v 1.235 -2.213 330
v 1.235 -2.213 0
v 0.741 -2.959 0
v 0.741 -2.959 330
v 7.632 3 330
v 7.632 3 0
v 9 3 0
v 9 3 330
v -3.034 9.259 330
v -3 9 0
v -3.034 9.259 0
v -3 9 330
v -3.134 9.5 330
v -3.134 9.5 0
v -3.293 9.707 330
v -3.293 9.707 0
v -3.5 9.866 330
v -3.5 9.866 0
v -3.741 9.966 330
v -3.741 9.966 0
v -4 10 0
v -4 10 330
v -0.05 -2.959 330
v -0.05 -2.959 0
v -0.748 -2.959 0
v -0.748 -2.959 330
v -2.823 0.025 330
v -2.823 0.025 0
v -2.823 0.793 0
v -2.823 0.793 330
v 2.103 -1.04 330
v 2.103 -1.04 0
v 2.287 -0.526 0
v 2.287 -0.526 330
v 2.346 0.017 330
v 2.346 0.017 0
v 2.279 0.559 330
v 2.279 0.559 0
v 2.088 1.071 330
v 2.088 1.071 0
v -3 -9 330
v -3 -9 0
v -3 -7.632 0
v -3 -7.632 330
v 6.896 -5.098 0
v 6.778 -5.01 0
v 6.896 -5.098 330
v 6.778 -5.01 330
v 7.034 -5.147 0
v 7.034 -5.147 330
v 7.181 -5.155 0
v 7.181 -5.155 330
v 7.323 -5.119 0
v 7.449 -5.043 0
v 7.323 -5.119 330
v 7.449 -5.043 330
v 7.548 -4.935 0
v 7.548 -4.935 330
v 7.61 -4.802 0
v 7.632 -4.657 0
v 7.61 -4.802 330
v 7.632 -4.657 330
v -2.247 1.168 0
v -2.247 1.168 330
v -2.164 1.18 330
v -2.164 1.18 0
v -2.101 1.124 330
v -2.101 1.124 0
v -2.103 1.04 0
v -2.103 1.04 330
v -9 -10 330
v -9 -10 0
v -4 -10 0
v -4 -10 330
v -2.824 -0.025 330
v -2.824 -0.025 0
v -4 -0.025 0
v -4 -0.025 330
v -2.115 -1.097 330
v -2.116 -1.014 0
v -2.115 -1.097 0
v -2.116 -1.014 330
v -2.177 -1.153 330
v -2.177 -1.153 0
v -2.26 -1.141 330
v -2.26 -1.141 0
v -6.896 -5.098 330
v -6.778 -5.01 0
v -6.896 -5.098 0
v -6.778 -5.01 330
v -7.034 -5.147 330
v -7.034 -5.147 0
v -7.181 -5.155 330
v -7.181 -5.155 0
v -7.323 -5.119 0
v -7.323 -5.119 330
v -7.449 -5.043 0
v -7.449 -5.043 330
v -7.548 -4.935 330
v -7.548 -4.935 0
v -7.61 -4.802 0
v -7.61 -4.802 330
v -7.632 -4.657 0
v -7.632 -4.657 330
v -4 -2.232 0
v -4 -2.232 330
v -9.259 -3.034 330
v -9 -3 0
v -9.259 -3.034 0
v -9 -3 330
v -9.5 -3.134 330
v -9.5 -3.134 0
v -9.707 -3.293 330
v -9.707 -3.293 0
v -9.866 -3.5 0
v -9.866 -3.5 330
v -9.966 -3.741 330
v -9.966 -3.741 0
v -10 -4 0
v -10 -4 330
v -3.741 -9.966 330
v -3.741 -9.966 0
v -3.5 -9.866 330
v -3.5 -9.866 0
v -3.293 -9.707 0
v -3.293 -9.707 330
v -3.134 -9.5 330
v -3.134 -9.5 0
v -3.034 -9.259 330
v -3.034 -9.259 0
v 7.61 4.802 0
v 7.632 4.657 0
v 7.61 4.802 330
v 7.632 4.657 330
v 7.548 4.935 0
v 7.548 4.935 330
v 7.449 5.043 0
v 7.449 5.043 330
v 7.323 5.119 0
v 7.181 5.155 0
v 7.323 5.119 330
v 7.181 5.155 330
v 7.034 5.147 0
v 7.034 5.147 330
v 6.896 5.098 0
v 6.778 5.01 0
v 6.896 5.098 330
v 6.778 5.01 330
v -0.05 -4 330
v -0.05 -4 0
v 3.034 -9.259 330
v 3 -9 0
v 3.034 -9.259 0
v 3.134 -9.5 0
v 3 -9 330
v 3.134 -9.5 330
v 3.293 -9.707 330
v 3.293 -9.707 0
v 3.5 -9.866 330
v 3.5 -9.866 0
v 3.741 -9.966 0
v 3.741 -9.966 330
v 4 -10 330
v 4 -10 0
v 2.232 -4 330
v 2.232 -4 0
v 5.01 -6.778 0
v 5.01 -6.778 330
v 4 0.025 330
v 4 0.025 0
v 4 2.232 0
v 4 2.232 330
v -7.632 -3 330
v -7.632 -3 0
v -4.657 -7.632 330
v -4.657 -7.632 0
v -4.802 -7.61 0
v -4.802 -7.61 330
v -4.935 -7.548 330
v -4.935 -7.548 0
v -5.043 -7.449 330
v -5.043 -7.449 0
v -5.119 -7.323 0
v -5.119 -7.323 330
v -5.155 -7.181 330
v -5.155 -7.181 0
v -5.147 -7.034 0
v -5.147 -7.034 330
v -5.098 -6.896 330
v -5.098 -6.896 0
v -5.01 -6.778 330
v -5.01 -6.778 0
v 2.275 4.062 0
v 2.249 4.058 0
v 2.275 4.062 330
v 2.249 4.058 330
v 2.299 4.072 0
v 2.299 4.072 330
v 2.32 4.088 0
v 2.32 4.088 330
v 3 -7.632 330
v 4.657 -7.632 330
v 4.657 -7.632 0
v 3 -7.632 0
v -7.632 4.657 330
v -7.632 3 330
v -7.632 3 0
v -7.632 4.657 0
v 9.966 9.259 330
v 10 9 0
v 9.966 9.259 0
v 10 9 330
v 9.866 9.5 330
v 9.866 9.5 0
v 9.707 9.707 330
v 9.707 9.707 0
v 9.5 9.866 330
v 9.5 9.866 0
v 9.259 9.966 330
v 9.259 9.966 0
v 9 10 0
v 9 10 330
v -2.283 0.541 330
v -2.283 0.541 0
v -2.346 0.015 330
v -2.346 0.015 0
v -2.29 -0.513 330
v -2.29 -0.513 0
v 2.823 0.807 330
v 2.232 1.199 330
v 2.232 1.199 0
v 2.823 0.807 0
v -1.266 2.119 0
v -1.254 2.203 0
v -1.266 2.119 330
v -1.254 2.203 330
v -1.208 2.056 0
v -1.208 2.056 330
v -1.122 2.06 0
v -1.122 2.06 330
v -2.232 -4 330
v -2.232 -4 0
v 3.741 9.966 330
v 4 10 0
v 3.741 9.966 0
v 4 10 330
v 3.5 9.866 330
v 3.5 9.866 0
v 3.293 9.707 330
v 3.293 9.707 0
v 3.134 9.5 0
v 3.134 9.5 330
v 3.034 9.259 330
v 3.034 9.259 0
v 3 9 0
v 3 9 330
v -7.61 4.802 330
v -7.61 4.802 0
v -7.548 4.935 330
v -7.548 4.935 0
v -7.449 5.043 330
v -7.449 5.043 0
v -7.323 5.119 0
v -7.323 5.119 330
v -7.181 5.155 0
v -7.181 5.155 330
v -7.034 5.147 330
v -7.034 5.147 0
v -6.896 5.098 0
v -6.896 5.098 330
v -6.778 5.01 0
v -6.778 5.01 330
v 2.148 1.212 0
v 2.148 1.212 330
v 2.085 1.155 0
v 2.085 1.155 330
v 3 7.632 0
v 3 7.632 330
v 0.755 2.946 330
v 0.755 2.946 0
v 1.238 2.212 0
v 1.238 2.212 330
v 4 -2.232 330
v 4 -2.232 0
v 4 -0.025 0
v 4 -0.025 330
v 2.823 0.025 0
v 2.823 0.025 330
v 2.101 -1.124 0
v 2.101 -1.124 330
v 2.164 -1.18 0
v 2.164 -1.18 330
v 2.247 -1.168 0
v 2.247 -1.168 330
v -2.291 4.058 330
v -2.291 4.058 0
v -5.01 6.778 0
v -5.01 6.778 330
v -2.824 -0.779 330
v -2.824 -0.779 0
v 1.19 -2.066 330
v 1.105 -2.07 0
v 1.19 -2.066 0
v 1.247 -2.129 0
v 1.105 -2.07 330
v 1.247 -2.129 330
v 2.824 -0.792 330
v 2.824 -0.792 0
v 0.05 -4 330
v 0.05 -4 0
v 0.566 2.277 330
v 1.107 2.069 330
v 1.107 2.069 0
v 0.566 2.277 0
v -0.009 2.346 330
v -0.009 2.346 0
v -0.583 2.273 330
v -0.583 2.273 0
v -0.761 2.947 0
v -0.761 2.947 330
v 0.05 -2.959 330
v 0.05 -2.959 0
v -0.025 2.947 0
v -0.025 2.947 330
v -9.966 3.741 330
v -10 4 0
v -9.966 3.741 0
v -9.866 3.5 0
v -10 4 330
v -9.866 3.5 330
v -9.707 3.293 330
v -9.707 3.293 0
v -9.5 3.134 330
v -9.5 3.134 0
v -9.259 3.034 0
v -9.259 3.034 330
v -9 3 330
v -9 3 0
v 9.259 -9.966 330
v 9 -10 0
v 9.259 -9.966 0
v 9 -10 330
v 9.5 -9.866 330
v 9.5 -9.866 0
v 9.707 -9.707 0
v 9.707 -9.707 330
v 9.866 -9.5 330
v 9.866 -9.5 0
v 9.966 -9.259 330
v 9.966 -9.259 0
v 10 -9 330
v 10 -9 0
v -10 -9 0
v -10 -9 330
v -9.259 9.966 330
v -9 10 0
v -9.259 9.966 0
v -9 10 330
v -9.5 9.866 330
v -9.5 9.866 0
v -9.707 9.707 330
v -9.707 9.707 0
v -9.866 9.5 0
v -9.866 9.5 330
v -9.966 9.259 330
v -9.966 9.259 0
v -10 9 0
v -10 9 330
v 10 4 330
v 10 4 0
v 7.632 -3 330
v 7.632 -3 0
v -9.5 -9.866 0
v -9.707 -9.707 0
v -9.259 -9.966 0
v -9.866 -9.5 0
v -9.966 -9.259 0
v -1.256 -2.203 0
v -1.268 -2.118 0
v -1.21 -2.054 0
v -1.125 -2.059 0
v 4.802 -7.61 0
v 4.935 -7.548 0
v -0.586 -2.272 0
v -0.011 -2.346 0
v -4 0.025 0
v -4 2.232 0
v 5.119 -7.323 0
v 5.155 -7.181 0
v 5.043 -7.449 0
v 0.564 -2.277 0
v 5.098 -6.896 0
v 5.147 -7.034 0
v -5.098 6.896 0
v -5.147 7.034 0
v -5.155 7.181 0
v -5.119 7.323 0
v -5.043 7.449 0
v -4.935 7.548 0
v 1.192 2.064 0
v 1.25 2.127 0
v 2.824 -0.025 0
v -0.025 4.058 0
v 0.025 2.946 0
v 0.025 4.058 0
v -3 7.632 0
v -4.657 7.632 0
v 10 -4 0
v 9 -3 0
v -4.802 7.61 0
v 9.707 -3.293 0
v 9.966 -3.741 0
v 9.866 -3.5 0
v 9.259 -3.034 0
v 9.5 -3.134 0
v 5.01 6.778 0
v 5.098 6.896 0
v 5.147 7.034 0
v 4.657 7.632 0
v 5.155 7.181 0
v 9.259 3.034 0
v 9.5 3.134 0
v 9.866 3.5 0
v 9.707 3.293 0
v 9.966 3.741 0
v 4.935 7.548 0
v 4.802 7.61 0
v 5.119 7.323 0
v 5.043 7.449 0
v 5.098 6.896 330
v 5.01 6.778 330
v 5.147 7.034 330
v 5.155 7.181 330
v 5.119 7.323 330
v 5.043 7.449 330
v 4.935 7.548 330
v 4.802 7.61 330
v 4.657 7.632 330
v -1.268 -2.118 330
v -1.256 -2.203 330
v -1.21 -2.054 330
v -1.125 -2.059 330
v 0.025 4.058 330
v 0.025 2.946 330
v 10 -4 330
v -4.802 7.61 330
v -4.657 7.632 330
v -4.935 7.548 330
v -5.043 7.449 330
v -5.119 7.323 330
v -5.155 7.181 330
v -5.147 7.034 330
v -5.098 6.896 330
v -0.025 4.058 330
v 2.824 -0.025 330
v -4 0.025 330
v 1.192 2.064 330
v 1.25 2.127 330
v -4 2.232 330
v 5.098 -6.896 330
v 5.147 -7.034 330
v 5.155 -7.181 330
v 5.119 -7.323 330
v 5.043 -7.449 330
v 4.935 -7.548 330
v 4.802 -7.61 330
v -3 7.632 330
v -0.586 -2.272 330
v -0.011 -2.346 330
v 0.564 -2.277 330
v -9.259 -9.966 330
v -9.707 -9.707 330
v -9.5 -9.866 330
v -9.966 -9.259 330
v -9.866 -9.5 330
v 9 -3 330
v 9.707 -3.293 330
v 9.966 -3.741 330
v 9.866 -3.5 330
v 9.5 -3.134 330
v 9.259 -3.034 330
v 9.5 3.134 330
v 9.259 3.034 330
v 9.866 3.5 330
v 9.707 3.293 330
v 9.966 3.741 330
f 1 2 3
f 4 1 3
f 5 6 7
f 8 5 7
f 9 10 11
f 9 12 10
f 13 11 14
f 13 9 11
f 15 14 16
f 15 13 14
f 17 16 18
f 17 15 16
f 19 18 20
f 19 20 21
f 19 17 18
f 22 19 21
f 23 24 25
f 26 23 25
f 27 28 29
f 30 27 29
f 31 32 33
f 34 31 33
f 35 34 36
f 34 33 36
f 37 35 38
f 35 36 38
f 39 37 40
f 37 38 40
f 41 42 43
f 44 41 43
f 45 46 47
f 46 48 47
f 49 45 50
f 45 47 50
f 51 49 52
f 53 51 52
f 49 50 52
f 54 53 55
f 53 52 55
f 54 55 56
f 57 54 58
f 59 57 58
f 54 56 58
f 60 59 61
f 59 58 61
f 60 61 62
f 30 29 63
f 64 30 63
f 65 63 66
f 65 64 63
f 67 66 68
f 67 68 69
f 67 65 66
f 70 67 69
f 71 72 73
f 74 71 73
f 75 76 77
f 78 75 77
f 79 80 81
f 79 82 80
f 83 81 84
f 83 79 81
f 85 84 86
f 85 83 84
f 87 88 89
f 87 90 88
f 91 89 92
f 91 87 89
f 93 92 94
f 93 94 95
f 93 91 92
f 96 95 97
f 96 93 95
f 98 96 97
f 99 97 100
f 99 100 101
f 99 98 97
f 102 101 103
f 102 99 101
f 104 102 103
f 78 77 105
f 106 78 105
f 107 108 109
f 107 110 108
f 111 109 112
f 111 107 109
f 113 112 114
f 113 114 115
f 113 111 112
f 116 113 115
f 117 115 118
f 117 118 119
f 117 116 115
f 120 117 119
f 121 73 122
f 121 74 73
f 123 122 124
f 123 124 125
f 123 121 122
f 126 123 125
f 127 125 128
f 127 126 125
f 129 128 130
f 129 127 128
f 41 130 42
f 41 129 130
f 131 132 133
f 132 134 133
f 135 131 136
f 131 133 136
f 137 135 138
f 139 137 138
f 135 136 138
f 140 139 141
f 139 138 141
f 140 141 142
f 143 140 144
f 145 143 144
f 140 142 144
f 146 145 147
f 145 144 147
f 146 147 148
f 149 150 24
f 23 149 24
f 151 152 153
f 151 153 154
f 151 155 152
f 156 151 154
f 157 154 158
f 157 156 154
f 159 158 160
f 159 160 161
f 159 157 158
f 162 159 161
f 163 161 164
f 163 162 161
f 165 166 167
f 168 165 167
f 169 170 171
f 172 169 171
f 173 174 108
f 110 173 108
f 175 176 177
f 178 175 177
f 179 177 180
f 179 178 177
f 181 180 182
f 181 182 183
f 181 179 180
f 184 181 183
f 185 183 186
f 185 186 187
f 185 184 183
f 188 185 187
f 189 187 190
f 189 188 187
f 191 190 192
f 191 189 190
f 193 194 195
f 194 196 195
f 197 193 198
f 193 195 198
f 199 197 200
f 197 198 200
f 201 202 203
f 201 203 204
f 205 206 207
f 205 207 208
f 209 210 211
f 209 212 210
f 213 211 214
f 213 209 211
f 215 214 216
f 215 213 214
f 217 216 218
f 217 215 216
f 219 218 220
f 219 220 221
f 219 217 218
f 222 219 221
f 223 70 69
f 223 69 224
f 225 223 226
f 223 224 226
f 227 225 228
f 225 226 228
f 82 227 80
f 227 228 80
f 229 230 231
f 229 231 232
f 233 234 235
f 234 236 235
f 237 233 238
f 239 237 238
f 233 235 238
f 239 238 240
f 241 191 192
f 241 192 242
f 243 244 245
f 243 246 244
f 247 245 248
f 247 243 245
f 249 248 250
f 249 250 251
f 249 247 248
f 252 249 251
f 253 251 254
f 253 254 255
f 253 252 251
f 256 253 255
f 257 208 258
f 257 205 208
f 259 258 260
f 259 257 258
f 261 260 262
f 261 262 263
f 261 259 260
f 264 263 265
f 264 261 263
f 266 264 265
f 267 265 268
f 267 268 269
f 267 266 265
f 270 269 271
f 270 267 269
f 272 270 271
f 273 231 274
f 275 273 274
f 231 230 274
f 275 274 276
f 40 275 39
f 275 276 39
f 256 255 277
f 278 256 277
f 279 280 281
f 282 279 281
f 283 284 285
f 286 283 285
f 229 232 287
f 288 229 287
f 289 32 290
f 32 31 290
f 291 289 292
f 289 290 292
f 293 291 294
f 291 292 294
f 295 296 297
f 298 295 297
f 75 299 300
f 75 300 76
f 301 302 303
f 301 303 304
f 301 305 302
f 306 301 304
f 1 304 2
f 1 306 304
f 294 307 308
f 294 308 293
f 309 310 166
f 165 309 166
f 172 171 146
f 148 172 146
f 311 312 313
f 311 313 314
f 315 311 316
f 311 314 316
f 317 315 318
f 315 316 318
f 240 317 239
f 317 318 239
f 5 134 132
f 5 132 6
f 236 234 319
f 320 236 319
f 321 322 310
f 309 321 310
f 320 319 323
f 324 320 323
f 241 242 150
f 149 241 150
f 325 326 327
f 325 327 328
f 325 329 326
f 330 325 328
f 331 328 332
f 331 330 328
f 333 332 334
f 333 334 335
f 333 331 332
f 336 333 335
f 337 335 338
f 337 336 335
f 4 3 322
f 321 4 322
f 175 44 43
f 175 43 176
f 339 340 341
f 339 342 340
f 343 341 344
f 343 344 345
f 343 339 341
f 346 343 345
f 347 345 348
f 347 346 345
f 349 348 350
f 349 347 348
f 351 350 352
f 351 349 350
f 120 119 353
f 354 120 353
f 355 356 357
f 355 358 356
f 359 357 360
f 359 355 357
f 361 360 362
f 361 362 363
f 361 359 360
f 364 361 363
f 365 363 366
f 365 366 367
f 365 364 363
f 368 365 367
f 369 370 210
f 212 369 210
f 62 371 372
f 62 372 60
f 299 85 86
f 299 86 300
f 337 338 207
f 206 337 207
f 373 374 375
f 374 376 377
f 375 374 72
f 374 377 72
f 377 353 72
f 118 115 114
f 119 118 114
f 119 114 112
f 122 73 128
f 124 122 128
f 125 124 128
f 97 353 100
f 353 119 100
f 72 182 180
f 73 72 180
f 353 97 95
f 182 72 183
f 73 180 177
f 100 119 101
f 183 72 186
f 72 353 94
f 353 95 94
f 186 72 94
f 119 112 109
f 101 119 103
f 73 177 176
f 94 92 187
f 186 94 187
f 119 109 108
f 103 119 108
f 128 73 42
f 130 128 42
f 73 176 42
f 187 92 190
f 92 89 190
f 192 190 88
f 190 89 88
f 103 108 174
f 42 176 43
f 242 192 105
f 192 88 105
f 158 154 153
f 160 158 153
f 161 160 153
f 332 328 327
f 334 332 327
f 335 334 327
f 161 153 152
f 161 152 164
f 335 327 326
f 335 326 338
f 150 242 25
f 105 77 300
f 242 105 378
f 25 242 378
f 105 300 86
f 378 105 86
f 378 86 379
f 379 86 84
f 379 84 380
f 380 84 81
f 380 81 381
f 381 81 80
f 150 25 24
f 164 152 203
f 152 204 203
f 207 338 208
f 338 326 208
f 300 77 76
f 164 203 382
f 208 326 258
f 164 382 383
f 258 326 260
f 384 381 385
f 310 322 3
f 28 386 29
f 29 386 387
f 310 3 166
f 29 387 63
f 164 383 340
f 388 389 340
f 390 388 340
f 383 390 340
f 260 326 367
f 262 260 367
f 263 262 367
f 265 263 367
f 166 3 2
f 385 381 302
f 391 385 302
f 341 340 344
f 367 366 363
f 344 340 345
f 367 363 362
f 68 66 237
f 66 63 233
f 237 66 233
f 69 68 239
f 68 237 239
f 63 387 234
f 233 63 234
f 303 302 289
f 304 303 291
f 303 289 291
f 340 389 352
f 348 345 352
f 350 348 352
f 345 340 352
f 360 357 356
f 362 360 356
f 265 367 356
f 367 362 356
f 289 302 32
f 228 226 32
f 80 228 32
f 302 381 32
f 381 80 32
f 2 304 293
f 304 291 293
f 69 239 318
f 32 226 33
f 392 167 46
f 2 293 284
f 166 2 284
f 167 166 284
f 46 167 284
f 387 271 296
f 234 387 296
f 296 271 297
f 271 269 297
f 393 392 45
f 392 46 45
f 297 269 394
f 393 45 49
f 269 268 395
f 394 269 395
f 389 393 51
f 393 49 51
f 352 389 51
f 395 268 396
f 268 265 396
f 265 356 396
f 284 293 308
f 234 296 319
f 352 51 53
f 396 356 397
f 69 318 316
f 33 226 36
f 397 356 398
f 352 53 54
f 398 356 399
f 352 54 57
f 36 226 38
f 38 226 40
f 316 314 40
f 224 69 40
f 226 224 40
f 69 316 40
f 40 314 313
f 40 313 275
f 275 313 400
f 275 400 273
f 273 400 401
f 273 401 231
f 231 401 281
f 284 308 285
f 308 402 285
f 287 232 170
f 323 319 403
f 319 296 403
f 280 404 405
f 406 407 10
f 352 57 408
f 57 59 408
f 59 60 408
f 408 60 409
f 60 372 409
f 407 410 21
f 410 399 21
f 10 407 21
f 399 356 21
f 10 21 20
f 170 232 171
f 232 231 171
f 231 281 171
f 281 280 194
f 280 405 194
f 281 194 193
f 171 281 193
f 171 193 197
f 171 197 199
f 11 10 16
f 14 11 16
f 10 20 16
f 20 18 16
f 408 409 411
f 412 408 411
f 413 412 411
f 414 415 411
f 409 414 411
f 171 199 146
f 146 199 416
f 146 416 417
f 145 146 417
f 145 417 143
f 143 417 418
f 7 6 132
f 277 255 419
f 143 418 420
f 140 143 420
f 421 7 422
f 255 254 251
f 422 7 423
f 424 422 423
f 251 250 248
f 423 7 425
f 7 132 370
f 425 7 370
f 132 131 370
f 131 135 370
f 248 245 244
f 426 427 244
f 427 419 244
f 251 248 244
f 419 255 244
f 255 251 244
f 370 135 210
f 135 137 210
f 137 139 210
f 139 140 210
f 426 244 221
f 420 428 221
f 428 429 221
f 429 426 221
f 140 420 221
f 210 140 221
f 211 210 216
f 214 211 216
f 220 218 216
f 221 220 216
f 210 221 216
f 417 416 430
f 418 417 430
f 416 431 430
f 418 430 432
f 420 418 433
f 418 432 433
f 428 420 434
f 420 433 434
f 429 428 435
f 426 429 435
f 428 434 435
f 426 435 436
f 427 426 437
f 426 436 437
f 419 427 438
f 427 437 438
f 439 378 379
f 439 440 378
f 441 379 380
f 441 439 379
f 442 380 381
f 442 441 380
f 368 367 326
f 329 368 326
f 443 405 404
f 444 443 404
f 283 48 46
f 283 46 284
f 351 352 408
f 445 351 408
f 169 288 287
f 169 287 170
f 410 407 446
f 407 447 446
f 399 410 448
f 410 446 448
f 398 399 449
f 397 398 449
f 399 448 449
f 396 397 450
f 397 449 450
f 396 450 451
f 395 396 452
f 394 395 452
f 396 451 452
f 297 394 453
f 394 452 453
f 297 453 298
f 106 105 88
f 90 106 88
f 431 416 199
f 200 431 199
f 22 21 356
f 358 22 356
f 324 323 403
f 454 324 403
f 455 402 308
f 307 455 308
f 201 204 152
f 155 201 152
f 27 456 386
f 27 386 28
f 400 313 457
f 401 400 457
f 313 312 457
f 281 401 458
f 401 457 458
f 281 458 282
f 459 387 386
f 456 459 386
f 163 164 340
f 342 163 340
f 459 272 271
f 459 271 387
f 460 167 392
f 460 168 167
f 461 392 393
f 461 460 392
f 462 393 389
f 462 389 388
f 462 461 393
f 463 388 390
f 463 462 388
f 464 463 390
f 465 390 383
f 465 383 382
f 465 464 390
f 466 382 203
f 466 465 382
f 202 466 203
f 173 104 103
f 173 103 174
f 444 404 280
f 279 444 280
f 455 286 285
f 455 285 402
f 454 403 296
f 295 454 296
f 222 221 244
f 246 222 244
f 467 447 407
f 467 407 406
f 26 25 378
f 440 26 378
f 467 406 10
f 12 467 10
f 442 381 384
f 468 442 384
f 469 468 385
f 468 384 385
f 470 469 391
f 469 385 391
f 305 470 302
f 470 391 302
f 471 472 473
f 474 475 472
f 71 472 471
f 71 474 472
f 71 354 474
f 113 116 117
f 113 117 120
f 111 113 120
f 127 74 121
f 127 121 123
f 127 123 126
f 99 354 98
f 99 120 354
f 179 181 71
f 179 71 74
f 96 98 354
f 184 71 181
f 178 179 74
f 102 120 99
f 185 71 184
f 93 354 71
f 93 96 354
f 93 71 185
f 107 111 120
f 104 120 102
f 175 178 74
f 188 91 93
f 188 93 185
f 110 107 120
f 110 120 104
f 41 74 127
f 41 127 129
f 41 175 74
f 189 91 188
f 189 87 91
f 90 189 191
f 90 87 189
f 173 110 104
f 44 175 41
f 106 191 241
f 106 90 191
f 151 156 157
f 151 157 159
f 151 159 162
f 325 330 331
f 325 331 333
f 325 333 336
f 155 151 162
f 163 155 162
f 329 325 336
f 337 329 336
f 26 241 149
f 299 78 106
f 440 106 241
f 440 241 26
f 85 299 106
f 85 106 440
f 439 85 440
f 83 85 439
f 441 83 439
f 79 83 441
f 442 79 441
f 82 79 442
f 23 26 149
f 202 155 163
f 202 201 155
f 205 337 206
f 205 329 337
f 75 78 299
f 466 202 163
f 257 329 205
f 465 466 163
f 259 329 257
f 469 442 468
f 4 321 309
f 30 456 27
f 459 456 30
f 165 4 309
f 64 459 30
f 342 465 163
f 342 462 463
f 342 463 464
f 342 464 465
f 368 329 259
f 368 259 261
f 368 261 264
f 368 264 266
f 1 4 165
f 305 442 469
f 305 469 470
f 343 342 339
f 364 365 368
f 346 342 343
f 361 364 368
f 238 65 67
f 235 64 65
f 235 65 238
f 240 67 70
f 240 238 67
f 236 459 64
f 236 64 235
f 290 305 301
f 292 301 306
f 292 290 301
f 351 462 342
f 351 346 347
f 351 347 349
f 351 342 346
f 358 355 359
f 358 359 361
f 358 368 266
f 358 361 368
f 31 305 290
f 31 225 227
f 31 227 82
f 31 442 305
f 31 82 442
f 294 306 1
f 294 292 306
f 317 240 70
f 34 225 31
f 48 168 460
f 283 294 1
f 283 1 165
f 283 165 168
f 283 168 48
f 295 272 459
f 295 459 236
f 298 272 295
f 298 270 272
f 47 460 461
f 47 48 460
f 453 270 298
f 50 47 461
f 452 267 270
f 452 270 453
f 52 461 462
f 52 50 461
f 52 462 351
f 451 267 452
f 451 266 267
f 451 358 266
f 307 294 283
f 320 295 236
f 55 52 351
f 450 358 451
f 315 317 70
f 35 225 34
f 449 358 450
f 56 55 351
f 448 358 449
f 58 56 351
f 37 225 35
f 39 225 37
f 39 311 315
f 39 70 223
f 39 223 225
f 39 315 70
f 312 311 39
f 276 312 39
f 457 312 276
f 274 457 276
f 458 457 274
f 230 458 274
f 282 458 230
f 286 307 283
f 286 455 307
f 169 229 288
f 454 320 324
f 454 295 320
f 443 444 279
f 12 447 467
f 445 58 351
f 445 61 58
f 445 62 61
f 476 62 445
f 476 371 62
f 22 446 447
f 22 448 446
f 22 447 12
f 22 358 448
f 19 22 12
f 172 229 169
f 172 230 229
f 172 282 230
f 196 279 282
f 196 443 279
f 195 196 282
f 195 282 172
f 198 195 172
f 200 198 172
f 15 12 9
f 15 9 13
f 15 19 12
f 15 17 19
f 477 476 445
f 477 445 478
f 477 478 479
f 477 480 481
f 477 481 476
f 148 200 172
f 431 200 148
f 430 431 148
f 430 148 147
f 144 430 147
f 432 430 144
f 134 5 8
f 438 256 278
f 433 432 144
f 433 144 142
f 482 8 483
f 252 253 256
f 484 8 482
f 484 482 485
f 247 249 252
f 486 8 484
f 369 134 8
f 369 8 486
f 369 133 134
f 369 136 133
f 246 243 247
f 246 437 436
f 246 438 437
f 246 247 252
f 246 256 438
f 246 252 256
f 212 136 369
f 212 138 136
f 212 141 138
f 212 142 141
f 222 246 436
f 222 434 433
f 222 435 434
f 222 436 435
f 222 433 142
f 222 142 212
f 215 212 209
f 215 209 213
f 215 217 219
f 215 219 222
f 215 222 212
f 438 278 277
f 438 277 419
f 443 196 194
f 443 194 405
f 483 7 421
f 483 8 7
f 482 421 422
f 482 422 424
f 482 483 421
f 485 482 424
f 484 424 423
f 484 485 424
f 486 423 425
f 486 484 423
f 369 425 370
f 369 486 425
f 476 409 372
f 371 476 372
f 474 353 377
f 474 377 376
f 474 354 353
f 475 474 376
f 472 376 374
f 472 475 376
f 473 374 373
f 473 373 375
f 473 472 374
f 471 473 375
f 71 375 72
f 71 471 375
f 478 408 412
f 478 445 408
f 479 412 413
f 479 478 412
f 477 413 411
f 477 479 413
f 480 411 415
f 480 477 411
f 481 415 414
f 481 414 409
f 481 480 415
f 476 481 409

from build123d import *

# Parameters (mm, degrees)
F1_DEPTH = 330
F2_R     = 1
F3_R     = 0.5
F4_R     = 0.1


with BuildPart() as f1:
    # F0 (on Top) → F1 (new body)
    with BuildSketch(Plane.XY):
        with BuildLine():
            Line((-0.025, 4.0583112277), (-2.2905442747, 4.0583112277))
            Line((-2.2905442747, 4.0583112277), (-5.8640526549, 7.6318196079))
            Line((-5.8640526549, 7.6318196079), (-3, 7.6318196079))
            Line((-3, 7.6318196079), (-3, 10))
            Line((-3, 10), (-10, 10))
            Line((-10, 10), (-10, 3))
            Line((-10, 3), (-7.6318196079, 3))
            Line((-7.6318196079, 3), (-7.6318196079, 5.8640526549))
            Line((-7.6318196079, 5.8640526549), (-4, 2.232233047))
            Line((-4, 2.232233047), (-4, 0.025))
            Line((-4, 0.025), (-2.8230957687, 0.025))
            Line((-2.8230957687, 0.025), (-2.8230957687, 0.7926485917))
            Line((-2.8230957687, 0.7926485917), (-1.8740334308, 1.411684829))
            ThreePointArc((-1.8740334308, 1.411684829), (-2.3460869309, 0.0270456781), (-1.906078865, -1.3681077138))
            Line((-1.906078865, -1.3681077138), (-2.8238623803, -0.7794121329))
            Line((-2.8238623803, -0.7794121329), (-2.8238623803, -0.025))
            Line((-2.8238623803, -0.025), (-4, -0.025))
            Line((-4, -0.025), (-4, -2.232233047))
            Line((-4, -2.232233047), (-7.6318196079, -5.8640526549))
            Line((-7.6318196079, -5.8640526549), (-7.6318196079, -3))
            Line((-7.6318196079, -3), (-10, -3))
            Line((-10, -3), (-10, -10))
            Line((-10, -10), (-3, -10))
            Line((-3, -10), (-3, -7.6318196079))
            Line((-3, -7.6318196079), (-5.8640526549, -7.6318196079))
            Line((-5.8640526549, -7.6318196079), (-2.232233047, -4))
            Line((-2.232233047, -4), (-0.05, -4))
            Line((-0.05, -4), (-0.05, -2.9588690959))
            Line((-0.05, -2.9588690959), (-0.7483266194, -2.9588690959))
            Line((-0.7483266194, -2.9588690959), (-1.5537911294, -1.7580069631))
            ThreePointArc((-1.5537911294, -1.7580069631), (-0.0257632285, -2.3461013645), (1.5148107083, -1.7917041816))
            Line((1.5148107083, -1.7917041816), (0.7406048023, -2.9588690959))
            Line((0.7406048023, -2.9588690959), (0.05, -2.9588690959))
            Line((0.05, -2.9588690959), (0.05, -4))
            Line((0.05, -4), (2.232233047, -4))
            Line((2.232233047, -4), (5.8640526549, -7.6318196079))
            Line((5.8640526549, -7.6318196079), (3, -7.6318196079))
            Line((3, -7.6318196079), (3, -10))
            Line((3, -10), (10, -10))
            Line((10, -10), (10, -3))
            Line((10, -3), (7.6318196079, -3))
            Line((7.6318196079, -3), (7.6318196079, -5.8640526549))
            Line((7.6318196079, -5.8640526549), (4, -2.232233047))
            Line((4, -2.232233047), (4, -0.025))
            Line((4, -0.025), (2.8238623803, -0.025))
            Line((2.8238623803, -0.025), (2.8238623803, -0.7921485609))
            Line((2.8238623803, -0.7921485609), (1.8740334308, -1.411684829))
            ThreePointArc((1.8740334308, -1.411684829), (2.3460040432, 0.0334721598), (1.8329957125, 1.4645757318))
            Line((1.8329957125, 1.4645757318), (2.8230957687, 0.8068363719))
            Line((2.8230957687, 0.8068363719), (2.8230957687, 0.025))
            Line((2.8230957687, 0.025), (4, 0.025))
            Line((4, 0.025), (4, 2.232233047))
            Line((4, 2.232233047), (7.6318196079, 5.8640526549))
            Line((7.6318196079, 5.8640526549), (7.6318196079, 3))
            Line((7.6318196079, 3), (10, 3))
            Line((10, 3), (10, 10))
            Line((10, 10), (3, 10))
            Line((3, 10), (3, 7.6318196079))
            Line((3, 7.6318196079), (5.8640526549, 7.6318196079))
            Line((5.8640526549, 7.6318196079), (2.2905442747, 4.0583112277))
            Line((2.2905442747, 4.0583112277), (0.025, 4.0583112277))
            Line((0.025, 4.0583112277), (0.025, 2.9460287187))
            Line((0.025, 2.9460287187), (0.7554459771, 2.9460287187))
            Line((0.7554459771, 2.9460287187), (1.5118729288, 1.7941838266))
            ThreePointArc((1.5118729288, 1.7941838266), (-0.0195250931, 2.3461615731), (-1.5415243666, 1.7687730164))
            Line((-1.5415243666, 1.7687730164), (-0.7608180556, 2.9474266339))
            Line((-0.7608180556, 2.9474266339), (-0.025, 2.9474266339))
            Line((-0.025, 2.9474266339), (-0.025, 4.0583112277))
        make_face()
    extrude(amount=F1_DEPTH)

    # F2
    f2_edges = [f1.edges().sort_by_distance(p)[0] for p in [
        (10, 10, 165),
        (10, -10, 165),
        (-10, -10, 165),
        (-3, -10, 165),
        (3, -10, 165),
        (-3, 10, 165),
        (-10, 3, 165),
        (10, 3, 165),
        (10, -3, 165),
        (-10, -3, 165),
        (-10, 10, 165),
        (3, 10, 165),
    ]]
    fillet(f2_edges, radius=F2_R)

    # F3
    f3_edges = [f1.edges().sort_by_distance(p)[0] for p in [
        (-7.63182, 5.864053, 165),
        (-5.864053, 7.63182, 165),
        (5.864053, 7.63182, 165),
        (7.63182, 5.864053, 165),
        (-7.63182, -5.864053, 165),
        (-5.864053, -7.63182, 165),
        (5.864053, -7.63182, 165),
        (7.63182, -5.864053, 165),
    ]]
    fillet(f3_edges, radius=F3_R)

    # F4
    f4_edges = [f1.edges().sort_by_distance(p)[0] for p in [
        (-1.874033, 1.411685, 165),
        (2.290544, 4.058311, 165),
        (4.656946, 7.63182, 165),
        (-1.541524, 1.768773, 165),
        (1.514811, -1.791704, 165),
        (1.874033, -1.411685, 165),
        (1.832996, 1.464576, 165),
        (1.511873, 1.794184, 165),
        (-1.906079, -1.368108, 165),
        (-1.553791, -1.758007, 165),
    ]]
    fillet(f4_edges, radius=F4_R)


solid = f1.part
